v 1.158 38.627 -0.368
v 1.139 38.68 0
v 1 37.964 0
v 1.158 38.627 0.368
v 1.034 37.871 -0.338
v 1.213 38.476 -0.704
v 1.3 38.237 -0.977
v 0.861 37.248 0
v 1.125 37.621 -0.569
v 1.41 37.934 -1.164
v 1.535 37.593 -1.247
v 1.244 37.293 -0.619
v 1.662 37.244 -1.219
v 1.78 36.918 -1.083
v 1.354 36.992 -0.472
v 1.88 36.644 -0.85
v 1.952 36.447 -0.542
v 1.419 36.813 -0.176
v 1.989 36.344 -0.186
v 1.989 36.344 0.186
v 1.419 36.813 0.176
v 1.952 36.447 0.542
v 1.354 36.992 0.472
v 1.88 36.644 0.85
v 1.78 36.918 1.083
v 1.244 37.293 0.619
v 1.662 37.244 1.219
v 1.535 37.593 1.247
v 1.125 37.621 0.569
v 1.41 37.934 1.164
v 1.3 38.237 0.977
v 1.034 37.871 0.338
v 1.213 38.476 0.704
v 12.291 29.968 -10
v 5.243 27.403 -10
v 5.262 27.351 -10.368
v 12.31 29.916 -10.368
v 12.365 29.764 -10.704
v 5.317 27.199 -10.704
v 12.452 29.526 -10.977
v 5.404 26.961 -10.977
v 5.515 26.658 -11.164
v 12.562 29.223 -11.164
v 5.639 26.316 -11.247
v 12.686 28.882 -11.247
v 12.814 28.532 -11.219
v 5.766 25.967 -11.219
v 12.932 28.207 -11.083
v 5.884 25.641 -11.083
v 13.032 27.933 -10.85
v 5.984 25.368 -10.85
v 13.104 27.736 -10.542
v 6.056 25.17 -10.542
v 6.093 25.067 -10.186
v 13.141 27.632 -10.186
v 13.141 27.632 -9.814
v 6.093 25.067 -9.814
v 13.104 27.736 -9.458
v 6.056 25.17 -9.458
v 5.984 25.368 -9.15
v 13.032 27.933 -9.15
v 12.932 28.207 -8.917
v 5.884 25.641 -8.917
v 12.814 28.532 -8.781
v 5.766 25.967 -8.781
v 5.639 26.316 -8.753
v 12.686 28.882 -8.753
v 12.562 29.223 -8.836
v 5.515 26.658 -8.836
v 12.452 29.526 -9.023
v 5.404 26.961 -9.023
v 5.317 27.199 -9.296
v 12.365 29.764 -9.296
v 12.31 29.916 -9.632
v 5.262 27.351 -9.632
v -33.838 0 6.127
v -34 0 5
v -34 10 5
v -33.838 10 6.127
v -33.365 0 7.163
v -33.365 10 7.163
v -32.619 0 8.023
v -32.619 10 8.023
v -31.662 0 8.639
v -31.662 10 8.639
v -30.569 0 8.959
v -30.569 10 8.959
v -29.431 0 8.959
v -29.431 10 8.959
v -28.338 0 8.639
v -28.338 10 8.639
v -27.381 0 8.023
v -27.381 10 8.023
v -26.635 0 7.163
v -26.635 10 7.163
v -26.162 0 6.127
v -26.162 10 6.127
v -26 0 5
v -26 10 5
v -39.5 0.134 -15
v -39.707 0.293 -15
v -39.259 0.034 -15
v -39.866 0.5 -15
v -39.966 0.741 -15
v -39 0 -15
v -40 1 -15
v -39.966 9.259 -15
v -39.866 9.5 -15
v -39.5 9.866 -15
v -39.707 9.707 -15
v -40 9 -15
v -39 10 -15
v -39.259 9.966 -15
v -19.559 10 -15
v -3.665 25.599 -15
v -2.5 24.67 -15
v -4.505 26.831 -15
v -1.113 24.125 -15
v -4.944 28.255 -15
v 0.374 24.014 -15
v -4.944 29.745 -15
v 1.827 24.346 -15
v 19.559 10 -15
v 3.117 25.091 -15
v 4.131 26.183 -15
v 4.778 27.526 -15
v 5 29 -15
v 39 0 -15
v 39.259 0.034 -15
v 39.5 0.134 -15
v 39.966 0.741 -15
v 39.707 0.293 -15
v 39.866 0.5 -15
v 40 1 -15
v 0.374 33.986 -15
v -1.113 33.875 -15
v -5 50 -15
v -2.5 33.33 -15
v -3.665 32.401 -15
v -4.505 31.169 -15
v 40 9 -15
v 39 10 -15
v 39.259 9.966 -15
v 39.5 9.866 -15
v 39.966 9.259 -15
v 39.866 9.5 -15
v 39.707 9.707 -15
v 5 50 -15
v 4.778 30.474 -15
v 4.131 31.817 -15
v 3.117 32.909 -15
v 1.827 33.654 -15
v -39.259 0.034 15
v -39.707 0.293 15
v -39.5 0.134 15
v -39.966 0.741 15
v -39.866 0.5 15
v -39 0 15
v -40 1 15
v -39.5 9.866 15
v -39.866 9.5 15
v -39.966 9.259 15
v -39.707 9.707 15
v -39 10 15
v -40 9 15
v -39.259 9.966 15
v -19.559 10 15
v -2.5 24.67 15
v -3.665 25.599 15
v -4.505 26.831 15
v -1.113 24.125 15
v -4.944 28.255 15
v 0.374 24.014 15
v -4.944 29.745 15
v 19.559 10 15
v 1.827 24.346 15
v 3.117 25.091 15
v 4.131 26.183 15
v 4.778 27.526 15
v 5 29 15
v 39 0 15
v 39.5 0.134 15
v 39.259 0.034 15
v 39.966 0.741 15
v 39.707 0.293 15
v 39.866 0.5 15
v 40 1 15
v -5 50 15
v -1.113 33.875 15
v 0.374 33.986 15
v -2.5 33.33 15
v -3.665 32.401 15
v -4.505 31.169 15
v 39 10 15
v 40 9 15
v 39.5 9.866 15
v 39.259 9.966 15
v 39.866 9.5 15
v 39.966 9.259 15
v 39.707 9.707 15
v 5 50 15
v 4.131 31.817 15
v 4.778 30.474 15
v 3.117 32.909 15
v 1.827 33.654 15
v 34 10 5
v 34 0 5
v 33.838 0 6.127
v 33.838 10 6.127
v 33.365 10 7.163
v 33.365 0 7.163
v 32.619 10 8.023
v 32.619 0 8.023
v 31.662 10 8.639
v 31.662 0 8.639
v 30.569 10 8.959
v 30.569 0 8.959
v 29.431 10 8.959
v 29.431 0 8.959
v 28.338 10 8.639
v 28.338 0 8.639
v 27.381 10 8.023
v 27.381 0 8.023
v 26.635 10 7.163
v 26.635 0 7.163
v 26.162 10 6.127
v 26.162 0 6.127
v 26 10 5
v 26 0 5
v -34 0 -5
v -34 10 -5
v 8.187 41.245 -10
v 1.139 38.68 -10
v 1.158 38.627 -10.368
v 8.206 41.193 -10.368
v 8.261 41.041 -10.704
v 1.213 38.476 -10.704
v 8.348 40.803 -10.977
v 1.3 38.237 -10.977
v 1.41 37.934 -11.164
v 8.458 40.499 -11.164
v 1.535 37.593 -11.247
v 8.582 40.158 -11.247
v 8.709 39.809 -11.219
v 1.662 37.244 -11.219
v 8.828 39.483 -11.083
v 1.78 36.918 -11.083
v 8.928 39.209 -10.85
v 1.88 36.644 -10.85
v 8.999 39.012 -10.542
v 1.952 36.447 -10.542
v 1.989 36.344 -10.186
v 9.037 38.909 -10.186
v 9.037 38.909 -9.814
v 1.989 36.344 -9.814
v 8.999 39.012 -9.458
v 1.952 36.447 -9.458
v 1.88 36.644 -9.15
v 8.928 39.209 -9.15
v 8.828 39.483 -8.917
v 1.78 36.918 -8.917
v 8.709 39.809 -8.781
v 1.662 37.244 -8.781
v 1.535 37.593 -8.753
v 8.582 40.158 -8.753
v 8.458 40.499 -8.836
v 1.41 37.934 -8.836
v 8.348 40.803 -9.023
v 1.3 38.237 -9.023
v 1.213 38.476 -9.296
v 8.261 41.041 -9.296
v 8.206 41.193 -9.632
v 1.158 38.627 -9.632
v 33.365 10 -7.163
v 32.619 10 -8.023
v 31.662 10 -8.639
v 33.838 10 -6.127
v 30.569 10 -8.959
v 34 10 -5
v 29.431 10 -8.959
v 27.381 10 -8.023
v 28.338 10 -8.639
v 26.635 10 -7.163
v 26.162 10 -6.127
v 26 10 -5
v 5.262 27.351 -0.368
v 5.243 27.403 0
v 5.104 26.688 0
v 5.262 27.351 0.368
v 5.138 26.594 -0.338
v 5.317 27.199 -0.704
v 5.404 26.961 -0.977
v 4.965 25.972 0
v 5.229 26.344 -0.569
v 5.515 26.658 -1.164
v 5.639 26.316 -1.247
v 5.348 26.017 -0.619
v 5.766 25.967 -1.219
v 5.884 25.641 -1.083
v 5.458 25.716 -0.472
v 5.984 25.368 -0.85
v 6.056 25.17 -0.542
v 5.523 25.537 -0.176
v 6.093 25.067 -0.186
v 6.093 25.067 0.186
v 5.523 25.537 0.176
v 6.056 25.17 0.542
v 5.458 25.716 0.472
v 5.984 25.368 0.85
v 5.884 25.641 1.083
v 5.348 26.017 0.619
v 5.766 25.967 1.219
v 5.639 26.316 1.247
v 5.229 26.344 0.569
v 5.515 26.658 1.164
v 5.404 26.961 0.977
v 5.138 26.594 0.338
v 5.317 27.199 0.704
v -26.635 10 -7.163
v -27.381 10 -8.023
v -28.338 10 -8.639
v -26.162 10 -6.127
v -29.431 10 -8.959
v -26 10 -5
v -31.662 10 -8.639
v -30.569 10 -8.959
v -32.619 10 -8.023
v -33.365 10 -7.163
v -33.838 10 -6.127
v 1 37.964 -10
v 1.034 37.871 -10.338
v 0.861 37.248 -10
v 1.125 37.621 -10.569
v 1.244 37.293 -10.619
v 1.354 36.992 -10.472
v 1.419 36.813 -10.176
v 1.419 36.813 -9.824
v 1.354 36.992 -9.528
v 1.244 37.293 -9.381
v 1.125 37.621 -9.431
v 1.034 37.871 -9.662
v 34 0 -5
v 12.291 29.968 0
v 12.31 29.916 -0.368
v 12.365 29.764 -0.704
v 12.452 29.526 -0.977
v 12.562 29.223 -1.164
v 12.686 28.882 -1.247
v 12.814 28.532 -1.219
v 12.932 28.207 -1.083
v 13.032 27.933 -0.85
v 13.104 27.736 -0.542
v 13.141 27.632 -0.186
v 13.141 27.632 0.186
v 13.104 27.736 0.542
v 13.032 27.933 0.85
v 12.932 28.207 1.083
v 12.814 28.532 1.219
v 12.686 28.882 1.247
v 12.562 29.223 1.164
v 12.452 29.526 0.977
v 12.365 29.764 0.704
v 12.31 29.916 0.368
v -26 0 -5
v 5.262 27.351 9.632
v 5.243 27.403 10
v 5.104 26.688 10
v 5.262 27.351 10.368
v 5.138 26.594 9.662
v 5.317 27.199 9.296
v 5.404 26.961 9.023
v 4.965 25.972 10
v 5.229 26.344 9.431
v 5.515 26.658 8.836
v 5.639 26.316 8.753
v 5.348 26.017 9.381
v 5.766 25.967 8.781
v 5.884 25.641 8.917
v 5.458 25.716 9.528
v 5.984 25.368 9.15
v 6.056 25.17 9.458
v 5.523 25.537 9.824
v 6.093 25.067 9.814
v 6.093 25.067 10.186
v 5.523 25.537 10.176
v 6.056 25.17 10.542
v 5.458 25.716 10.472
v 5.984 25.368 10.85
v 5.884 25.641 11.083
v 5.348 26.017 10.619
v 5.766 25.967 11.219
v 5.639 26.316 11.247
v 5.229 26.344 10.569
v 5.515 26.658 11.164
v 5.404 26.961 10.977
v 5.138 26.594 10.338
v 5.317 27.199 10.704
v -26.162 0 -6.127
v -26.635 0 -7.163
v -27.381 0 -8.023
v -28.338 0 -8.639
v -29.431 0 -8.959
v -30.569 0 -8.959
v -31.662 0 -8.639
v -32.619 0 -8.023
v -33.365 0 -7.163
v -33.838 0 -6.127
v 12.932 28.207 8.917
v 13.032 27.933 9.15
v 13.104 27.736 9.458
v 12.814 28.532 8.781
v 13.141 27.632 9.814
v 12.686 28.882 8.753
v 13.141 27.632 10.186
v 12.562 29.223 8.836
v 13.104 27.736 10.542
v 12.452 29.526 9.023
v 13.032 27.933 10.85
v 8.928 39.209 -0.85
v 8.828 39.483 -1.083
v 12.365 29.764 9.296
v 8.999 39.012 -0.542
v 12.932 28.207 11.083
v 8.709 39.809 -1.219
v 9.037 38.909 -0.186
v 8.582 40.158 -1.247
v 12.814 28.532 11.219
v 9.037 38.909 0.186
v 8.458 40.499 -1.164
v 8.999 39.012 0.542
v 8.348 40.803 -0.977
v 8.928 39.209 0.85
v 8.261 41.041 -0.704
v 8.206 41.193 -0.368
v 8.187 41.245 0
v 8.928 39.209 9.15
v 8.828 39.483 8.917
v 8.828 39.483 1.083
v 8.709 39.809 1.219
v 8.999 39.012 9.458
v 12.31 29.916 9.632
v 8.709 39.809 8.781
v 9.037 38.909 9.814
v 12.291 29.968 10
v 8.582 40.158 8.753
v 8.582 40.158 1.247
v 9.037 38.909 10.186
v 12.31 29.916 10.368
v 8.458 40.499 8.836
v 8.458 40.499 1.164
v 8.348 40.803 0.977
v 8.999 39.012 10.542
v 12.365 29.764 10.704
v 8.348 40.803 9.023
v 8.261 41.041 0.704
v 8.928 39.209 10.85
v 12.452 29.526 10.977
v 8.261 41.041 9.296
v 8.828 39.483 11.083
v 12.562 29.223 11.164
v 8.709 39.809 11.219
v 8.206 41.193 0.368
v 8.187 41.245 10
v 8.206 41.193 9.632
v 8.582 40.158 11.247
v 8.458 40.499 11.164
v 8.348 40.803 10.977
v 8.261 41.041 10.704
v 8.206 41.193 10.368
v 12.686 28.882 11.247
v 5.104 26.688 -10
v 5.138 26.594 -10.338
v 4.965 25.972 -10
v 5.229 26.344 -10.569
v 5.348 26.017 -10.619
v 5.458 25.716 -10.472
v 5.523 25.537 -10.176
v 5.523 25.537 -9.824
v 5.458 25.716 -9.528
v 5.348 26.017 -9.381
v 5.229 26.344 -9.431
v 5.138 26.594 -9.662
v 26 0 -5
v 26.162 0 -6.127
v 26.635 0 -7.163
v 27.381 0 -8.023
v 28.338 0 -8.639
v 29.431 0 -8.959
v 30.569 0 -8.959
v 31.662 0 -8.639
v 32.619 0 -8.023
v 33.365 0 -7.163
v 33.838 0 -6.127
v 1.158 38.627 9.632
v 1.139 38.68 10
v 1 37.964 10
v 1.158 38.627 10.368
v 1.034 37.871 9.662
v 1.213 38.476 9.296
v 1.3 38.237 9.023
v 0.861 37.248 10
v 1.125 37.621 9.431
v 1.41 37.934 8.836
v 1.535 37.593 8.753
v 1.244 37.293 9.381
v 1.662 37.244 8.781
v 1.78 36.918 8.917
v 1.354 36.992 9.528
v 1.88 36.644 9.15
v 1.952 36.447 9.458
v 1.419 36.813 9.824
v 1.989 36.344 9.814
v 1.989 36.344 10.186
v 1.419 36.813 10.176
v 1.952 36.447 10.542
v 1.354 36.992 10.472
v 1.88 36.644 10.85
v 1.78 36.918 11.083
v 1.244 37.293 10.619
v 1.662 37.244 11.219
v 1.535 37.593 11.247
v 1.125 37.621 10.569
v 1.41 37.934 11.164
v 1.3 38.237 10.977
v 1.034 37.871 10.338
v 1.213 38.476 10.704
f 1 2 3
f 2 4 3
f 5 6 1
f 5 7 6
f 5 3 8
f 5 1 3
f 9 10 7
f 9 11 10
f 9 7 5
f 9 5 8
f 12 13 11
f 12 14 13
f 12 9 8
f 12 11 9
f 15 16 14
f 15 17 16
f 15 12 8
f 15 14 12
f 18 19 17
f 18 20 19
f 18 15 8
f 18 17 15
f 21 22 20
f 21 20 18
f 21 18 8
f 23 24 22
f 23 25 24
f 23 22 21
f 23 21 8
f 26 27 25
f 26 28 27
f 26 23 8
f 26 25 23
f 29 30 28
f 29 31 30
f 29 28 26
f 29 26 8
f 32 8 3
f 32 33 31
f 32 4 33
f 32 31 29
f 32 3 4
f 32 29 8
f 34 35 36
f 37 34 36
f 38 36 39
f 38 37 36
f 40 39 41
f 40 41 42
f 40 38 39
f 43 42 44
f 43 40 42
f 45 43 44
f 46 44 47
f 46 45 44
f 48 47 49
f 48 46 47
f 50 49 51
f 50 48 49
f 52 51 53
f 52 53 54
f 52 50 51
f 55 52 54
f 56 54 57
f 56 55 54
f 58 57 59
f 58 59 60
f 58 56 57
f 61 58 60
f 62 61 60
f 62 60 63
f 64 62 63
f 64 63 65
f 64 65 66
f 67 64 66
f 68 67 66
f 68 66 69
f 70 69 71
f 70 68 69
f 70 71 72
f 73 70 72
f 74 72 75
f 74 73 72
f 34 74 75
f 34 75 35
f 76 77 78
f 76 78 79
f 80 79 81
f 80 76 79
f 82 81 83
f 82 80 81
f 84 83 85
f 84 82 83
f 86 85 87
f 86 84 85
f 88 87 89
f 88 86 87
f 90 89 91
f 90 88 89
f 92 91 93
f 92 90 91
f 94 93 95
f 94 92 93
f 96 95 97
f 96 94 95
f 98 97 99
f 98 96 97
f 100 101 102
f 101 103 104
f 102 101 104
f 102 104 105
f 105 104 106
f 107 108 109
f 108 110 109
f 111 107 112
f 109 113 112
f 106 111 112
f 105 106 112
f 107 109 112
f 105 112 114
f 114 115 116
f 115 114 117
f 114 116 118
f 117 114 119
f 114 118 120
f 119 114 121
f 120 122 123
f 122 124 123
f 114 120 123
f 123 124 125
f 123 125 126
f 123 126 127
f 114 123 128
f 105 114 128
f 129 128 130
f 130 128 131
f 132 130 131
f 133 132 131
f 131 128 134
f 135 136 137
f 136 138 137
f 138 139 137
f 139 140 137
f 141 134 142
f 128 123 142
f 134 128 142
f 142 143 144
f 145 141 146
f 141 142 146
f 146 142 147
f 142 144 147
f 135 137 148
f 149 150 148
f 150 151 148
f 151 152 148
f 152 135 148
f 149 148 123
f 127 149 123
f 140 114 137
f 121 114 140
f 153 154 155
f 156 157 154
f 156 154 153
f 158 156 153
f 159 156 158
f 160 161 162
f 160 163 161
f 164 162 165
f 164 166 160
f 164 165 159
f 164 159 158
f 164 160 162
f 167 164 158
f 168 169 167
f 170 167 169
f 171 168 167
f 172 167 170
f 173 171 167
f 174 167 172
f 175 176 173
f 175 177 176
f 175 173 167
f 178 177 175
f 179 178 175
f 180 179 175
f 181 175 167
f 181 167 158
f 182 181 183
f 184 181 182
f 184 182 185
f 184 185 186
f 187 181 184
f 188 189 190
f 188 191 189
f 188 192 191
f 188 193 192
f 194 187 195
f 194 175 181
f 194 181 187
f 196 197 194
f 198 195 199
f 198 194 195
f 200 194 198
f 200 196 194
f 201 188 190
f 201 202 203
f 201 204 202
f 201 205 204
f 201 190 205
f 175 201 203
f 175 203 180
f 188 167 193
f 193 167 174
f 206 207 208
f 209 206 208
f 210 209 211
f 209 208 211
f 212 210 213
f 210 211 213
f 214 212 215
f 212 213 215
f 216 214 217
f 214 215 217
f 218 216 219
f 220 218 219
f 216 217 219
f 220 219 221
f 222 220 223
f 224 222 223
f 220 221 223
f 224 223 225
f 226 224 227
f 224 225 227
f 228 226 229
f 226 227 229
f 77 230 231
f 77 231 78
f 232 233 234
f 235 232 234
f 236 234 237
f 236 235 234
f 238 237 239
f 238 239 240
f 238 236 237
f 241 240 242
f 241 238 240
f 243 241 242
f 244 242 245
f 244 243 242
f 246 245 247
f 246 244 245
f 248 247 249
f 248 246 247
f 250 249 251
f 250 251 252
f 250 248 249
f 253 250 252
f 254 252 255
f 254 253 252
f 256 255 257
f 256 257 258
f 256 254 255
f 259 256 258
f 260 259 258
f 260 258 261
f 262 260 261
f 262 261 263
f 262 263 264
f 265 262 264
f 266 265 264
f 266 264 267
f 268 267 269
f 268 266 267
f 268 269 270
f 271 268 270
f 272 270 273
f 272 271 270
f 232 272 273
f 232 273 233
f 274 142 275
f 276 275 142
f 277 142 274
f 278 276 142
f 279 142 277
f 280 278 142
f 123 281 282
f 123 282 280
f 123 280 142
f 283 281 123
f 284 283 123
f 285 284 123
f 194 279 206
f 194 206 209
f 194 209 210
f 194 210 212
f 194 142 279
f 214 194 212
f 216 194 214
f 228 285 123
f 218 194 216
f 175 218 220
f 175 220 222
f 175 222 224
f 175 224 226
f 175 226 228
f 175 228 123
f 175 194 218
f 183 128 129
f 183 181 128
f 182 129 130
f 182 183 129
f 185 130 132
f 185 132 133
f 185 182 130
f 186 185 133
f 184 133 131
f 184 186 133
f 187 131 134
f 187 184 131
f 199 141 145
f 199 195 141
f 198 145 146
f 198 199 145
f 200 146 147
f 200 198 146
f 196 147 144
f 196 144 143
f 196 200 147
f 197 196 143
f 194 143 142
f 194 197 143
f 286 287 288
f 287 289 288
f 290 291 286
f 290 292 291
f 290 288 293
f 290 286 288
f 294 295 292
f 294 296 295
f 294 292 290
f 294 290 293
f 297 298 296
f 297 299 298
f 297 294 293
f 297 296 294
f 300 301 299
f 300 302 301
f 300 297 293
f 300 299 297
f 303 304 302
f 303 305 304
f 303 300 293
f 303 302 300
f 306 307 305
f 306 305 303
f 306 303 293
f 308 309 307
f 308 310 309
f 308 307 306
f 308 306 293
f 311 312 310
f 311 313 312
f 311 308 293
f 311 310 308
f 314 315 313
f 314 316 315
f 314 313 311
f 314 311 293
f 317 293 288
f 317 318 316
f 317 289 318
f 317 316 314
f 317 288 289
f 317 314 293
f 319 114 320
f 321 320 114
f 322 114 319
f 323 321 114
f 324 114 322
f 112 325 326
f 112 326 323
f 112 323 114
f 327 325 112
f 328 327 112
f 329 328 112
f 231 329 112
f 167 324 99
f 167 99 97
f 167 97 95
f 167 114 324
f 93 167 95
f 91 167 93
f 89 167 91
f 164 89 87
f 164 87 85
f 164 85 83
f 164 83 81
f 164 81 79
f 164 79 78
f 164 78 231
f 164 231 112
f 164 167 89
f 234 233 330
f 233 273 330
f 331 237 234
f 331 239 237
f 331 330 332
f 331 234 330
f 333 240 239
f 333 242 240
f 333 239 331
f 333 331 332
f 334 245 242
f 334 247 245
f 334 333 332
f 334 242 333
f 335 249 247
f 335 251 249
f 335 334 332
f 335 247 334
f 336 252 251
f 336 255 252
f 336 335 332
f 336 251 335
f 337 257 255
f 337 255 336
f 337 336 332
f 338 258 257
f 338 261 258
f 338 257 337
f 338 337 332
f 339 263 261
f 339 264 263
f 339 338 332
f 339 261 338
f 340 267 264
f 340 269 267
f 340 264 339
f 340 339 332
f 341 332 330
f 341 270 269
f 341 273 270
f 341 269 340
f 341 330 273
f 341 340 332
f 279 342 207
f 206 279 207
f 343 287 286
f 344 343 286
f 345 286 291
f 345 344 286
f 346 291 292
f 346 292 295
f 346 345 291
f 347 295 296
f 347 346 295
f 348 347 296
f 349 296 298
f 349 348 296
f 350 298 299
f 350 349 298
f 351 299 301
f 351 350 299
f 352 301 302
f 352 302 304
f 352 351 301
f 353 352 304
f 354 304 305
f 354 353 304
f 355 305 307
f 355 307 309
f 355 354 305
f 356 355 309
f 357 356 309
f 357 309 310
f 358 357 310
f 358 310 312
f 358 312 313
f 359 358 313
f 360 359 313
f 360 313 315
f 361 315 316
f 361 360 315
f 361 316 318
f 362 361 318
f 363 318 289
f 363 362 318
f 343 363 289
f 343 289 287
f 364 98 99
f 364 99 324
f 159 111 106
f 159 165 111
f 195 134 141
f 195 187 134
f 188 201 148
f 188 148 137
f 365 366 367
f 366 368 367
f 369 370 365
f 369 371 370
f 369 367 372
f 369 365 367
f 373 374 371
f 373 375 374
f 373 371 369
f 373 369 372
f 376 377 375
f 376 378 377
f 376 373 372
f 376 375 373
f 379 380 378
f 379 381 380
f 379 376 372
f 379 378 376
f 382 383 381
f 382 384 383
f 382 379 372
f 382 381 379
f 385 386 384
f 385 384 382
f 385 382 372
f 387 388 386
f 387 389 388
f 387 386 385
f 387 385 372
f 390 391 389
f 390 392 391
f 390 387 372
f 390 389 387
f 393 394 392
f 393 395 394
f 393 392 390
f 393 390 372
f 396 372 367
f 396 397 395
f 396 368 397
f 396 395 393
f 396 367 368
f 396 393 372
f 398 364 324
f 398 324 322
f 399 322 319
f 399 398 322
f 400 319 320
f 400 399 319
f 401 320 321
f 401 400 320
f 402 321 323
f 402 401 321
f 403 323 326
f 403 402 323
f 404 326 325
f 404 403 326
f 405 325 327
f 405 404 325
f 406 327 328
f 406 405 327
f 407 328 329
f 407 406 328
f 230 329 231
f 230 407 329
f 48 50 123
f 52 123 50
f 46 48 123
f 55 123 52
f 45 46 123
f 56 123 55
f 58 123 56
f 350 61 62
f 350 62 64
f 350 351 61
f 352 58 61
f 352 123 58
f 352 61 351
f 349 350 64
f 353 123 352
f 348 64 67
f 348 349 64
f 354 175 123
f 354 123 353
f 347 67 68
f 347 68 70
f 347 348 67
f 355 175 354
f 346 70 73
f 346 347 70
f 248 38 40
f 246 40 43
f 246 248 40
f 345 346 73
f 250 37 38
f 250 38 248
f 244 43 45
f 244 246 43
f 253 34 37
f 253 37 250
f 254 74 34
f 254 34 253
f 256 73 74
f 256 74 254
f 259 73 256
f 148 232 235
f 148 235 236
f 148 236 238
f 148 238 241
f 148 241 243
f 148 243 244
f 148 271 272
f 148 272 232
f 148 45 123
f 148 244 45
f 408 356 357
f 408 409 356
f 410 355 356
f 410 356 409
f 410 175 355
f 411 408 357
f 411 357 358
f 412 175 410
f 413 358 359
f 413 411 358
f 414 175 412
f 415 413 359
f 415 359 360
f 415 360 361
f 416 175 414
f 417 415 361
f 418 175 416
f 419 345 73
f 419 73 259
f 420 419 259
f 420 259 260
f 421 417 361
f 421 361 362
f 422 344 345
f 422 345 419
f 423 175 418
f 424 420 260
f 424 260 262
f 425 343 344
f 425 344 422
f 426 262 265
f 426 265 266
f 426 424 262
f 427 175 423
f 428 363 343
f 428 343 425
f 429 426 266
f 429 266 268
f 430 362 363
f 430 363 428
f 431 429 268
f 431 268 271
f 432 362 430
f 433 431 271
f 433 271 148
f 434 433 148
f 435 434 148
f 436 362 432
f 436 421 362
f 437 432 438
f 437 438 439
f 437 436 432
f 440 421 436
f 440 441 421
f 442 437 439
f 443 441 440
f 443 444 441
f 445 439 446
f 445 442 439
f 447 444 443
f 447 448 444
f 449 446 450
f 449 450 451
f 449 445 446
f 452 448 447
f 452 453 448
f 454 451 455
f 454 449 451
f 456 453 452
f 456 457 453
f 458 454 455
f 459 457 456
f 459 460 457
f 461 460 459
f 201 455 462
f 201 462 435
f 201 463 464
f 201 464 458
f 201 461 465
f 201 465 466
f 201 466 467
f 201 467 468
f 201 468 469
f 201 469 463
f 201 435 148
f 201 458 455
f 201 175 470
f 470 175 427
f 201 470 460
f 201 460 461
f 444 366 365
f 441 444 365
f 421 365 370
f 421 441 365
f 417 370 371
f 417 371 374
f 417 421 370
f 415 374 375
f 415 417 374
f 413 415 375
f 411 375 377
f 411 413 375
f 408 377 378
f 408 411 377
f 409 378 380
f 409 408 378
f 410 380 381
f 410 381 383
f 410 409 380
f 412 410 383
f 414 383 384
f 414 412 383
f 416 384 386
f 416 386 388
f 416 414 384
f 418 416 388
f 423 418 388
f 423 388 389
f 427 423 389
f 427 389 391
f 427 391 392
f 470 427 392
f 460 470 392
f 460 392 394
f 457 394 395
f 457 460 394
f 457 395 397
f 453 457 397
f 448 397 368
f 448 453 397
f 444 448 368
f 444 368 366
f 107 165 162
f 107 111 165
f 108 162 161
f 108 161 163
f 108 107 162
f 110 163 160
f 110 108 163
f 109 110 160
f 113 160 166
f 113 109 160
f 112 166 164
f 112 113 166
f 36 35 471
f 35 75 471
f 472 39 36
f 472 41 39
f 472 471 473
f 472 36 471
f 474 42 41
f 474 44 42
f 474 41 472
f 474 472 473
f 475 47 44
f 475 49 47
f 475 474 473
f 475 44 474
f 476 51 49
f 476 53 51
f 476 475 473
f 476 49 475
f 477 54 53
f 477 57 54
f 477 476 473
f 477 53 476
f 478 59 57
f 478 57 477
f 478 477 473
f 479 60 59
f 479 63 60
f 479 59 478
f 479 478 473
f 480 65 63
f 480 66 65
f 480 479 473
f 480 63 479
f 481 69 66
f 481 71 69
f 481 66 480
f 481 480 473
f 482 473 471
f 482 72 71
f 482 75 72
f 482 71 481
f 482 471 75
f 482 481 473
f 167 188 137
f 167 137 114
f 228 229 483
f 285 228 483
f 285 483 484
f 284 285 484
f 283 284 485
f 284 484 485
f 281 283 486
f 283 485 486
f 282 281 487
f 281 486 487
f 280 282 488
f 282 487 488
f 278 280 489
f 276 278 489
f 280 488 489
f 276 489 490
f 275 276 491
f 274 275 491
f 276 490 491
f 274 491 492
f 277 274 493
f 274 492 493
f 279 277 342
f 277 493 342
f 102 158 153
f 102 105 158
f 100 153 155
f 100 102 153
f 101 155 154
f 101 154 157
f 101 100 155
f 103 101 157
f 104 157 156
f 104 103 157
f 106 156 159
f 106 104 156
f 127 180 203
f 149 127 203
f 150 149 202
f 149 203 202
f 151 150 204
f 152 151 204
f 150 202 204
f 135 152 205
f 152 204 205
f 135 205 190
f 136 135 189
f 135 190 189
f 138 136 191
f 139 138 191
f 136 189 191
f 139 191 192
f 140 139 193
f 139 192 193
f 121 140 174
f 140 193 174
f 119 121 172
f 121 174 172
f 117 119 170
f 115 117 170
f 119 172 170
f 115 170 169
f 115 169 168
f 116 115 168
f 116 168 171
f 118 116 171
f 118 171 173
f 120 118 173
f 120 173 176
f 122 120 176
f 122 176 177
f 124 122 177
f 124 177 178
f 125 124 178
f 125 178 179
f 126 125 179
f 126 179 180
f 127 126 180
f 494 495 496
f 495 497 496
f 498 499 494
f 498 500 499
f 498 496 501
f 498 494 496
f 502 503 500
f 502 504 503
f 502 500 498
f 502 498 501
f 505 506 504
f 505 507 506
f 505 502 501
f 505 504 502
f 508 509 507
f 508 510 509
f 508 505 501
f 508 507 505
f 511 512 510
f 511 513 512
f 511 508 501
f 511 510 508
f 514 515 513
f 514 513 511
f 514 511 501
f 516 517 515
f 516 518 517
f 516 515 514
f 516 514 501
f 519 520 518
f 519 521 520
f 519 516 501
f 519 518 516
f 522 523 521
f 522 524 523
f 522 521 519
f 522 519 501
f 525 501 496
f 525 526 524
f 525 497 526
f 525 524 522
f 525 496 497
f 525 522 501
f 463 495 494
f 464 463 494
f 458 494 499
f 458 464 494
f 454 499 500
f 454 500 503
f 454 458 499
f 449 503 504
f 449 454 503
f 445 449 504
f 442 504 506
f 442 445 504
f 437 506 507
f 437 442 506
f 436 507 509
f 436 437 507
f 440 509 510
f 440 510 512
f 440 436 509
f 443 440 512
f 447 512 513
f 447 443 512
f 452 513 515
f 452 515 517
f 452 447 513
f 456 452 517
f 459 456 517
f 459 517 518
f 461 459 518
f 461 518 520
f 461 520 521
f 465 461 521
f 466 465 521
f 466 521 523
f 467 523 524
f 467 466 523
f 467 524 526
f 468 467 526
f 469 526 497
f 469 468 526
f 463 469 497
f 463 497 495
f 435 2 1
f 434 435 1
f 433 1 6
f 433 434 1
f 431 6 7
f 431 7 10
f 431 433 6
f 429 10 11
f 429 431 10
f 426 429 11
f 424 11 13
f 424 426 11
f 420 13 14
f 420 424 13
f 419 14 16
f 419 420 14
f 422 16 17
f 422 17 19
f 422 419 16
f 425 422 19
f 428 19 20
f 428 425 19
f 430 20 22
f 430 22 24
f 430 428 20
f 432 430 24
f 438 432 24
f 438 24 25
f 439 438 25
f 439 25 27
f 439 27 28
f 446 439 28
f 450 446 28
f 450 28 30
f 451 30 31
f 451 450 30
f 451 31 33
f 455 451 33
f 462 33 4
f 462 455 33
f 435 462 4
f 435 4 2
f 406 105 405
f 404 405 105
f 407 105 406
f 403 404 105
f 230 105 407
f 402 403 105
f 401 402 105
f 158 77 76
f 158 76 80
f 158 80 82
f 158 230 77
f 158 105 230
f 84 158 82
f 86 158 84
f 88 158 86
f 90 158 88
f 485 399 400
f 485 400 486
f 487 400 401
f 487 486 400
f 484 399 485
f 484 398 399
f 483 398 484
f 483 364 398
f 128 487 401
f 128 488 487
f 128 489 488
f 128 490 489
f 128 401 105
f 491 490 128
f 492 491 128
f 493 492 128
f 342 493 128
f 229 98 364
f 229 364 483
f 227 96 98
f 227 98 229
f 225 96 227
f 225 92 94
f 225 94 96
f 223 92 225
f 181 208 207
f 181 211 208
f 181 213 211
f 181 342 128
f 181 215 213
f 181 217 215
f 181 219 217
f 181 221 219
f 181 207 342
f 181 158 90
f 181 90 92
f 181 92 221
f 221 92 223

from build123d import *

# Parameters (mm, degrees)
BASE_EXTRUDE_DEPTH   = 15
SLOT_CUT_DEPTH       = 66.76473219
SKETCH5_R            = 5
GUIDE_HOLE_DEPTH     = 71.710678119
LPATTERN1_COUNT      = 3
LPATTERN1_PITCH      = 10
LPATTERN1_COUNT_DIR2 = 2
LPATTERN1_PITCH_DIR2 = 12
FILLET1_R            = 1


with BuildPart() as part:
    # Sketch2 → Base Extrude (new, symmetric)
    with BuildSketch(Plane.XY):
        Polygon((-40, 0), (40, 0), (40, 10), (19.558809371, 10), (5, 50), (-5, 50), (-19.558809371, 10), (-40, 10), align=None)
    extrude(amount=BASE_EXTRUDE_DEPTH, both=True)

    # Sketch4 → Slot Cut (cut, through all)
    with BuildSketch(Plane(origin=(0, 0, 0), x_dir=(1, 0, 0), z_dir=(0, 1, 0))):
        with BuildLine():
            Line((26, -5), (26, 5))
            ThreePointArc((26, 5), (30, 9), (34, 5))
            Line((34, 5), (34, -5))
            ThreePointArc((34, -5), (30, -9), (26, -5))
        make_face()
    slot_cut = extrude(amount=SLOT_CUT_DEPTH, mode=Mode.SUBTRACT)

    # Mirror1: Slot Cut across plane
    add(slot_cut.mirror(Plane(origin=(0, 0, 0), x_dir=(0, 0, 1), z_dir=(1, 0, 0))), mode=Mode.SUBTRACT)

    # Sketch5 → Guide Hole (cut, through all)
    with BuildSketch(Plane.XY.offset(15)):
        with Locations((0, 29)):
            Circle(SKETCH5_R)
    extrude(amount=-GUIDE_HOLE_DEPTH, mode=Mode.SUBTRACT)

    # Sketch10 → M3x0.5 Tapped Hole2 (revolve, cut)
    with BuildSketch(Plane(origin=(12.718406504, 28.793852416, 10), x_dir=(-0.3420201433256662, 0.9396926207859093, 0), z_dir=(0, 0, 1))):
        Polygon((0, 0), (0, 8.251075774), (1.25, 7.5), (1.25, 0), align=None)
    m3x0_5_tapped_hole2 = revolve(axis=Axis((18.685454646, 30.965680326, 10), (-0.9396926207859093, -0.34202014332566616, 0)), mode=Mode.SUBTRACT)

    # LPattern1: M3x0.5 Tapped Hole2 3 × 2
    with Locations(*[Vector(0, 0, -1) * (i * LPATTERN1_PITCH) + Vector(-0.34202014332566616, 0.9396926207859094, 0) * (j * LPATTERN1_PITCH_DIR2) for i in range(LPATTERN1_COUNT) for j in range(LPATTERN1_COUNT_DIR2) if (i, j) != (0, 0)]):
        add(m3x0_5_tapped_hole2, mode=Mode.SUBTRACT)

    # Fillet1
    fillet1_edges = [part.edges().sort_by_distance(p)[0] for p in [
        (40, 0, 0),
        (-40, 0, 0),
        (-40, 10, 0),
        (40, 10, 0),
    ]]
    fillet(fillet1_edges, radius=FILLET1_R)


solid = part.part
